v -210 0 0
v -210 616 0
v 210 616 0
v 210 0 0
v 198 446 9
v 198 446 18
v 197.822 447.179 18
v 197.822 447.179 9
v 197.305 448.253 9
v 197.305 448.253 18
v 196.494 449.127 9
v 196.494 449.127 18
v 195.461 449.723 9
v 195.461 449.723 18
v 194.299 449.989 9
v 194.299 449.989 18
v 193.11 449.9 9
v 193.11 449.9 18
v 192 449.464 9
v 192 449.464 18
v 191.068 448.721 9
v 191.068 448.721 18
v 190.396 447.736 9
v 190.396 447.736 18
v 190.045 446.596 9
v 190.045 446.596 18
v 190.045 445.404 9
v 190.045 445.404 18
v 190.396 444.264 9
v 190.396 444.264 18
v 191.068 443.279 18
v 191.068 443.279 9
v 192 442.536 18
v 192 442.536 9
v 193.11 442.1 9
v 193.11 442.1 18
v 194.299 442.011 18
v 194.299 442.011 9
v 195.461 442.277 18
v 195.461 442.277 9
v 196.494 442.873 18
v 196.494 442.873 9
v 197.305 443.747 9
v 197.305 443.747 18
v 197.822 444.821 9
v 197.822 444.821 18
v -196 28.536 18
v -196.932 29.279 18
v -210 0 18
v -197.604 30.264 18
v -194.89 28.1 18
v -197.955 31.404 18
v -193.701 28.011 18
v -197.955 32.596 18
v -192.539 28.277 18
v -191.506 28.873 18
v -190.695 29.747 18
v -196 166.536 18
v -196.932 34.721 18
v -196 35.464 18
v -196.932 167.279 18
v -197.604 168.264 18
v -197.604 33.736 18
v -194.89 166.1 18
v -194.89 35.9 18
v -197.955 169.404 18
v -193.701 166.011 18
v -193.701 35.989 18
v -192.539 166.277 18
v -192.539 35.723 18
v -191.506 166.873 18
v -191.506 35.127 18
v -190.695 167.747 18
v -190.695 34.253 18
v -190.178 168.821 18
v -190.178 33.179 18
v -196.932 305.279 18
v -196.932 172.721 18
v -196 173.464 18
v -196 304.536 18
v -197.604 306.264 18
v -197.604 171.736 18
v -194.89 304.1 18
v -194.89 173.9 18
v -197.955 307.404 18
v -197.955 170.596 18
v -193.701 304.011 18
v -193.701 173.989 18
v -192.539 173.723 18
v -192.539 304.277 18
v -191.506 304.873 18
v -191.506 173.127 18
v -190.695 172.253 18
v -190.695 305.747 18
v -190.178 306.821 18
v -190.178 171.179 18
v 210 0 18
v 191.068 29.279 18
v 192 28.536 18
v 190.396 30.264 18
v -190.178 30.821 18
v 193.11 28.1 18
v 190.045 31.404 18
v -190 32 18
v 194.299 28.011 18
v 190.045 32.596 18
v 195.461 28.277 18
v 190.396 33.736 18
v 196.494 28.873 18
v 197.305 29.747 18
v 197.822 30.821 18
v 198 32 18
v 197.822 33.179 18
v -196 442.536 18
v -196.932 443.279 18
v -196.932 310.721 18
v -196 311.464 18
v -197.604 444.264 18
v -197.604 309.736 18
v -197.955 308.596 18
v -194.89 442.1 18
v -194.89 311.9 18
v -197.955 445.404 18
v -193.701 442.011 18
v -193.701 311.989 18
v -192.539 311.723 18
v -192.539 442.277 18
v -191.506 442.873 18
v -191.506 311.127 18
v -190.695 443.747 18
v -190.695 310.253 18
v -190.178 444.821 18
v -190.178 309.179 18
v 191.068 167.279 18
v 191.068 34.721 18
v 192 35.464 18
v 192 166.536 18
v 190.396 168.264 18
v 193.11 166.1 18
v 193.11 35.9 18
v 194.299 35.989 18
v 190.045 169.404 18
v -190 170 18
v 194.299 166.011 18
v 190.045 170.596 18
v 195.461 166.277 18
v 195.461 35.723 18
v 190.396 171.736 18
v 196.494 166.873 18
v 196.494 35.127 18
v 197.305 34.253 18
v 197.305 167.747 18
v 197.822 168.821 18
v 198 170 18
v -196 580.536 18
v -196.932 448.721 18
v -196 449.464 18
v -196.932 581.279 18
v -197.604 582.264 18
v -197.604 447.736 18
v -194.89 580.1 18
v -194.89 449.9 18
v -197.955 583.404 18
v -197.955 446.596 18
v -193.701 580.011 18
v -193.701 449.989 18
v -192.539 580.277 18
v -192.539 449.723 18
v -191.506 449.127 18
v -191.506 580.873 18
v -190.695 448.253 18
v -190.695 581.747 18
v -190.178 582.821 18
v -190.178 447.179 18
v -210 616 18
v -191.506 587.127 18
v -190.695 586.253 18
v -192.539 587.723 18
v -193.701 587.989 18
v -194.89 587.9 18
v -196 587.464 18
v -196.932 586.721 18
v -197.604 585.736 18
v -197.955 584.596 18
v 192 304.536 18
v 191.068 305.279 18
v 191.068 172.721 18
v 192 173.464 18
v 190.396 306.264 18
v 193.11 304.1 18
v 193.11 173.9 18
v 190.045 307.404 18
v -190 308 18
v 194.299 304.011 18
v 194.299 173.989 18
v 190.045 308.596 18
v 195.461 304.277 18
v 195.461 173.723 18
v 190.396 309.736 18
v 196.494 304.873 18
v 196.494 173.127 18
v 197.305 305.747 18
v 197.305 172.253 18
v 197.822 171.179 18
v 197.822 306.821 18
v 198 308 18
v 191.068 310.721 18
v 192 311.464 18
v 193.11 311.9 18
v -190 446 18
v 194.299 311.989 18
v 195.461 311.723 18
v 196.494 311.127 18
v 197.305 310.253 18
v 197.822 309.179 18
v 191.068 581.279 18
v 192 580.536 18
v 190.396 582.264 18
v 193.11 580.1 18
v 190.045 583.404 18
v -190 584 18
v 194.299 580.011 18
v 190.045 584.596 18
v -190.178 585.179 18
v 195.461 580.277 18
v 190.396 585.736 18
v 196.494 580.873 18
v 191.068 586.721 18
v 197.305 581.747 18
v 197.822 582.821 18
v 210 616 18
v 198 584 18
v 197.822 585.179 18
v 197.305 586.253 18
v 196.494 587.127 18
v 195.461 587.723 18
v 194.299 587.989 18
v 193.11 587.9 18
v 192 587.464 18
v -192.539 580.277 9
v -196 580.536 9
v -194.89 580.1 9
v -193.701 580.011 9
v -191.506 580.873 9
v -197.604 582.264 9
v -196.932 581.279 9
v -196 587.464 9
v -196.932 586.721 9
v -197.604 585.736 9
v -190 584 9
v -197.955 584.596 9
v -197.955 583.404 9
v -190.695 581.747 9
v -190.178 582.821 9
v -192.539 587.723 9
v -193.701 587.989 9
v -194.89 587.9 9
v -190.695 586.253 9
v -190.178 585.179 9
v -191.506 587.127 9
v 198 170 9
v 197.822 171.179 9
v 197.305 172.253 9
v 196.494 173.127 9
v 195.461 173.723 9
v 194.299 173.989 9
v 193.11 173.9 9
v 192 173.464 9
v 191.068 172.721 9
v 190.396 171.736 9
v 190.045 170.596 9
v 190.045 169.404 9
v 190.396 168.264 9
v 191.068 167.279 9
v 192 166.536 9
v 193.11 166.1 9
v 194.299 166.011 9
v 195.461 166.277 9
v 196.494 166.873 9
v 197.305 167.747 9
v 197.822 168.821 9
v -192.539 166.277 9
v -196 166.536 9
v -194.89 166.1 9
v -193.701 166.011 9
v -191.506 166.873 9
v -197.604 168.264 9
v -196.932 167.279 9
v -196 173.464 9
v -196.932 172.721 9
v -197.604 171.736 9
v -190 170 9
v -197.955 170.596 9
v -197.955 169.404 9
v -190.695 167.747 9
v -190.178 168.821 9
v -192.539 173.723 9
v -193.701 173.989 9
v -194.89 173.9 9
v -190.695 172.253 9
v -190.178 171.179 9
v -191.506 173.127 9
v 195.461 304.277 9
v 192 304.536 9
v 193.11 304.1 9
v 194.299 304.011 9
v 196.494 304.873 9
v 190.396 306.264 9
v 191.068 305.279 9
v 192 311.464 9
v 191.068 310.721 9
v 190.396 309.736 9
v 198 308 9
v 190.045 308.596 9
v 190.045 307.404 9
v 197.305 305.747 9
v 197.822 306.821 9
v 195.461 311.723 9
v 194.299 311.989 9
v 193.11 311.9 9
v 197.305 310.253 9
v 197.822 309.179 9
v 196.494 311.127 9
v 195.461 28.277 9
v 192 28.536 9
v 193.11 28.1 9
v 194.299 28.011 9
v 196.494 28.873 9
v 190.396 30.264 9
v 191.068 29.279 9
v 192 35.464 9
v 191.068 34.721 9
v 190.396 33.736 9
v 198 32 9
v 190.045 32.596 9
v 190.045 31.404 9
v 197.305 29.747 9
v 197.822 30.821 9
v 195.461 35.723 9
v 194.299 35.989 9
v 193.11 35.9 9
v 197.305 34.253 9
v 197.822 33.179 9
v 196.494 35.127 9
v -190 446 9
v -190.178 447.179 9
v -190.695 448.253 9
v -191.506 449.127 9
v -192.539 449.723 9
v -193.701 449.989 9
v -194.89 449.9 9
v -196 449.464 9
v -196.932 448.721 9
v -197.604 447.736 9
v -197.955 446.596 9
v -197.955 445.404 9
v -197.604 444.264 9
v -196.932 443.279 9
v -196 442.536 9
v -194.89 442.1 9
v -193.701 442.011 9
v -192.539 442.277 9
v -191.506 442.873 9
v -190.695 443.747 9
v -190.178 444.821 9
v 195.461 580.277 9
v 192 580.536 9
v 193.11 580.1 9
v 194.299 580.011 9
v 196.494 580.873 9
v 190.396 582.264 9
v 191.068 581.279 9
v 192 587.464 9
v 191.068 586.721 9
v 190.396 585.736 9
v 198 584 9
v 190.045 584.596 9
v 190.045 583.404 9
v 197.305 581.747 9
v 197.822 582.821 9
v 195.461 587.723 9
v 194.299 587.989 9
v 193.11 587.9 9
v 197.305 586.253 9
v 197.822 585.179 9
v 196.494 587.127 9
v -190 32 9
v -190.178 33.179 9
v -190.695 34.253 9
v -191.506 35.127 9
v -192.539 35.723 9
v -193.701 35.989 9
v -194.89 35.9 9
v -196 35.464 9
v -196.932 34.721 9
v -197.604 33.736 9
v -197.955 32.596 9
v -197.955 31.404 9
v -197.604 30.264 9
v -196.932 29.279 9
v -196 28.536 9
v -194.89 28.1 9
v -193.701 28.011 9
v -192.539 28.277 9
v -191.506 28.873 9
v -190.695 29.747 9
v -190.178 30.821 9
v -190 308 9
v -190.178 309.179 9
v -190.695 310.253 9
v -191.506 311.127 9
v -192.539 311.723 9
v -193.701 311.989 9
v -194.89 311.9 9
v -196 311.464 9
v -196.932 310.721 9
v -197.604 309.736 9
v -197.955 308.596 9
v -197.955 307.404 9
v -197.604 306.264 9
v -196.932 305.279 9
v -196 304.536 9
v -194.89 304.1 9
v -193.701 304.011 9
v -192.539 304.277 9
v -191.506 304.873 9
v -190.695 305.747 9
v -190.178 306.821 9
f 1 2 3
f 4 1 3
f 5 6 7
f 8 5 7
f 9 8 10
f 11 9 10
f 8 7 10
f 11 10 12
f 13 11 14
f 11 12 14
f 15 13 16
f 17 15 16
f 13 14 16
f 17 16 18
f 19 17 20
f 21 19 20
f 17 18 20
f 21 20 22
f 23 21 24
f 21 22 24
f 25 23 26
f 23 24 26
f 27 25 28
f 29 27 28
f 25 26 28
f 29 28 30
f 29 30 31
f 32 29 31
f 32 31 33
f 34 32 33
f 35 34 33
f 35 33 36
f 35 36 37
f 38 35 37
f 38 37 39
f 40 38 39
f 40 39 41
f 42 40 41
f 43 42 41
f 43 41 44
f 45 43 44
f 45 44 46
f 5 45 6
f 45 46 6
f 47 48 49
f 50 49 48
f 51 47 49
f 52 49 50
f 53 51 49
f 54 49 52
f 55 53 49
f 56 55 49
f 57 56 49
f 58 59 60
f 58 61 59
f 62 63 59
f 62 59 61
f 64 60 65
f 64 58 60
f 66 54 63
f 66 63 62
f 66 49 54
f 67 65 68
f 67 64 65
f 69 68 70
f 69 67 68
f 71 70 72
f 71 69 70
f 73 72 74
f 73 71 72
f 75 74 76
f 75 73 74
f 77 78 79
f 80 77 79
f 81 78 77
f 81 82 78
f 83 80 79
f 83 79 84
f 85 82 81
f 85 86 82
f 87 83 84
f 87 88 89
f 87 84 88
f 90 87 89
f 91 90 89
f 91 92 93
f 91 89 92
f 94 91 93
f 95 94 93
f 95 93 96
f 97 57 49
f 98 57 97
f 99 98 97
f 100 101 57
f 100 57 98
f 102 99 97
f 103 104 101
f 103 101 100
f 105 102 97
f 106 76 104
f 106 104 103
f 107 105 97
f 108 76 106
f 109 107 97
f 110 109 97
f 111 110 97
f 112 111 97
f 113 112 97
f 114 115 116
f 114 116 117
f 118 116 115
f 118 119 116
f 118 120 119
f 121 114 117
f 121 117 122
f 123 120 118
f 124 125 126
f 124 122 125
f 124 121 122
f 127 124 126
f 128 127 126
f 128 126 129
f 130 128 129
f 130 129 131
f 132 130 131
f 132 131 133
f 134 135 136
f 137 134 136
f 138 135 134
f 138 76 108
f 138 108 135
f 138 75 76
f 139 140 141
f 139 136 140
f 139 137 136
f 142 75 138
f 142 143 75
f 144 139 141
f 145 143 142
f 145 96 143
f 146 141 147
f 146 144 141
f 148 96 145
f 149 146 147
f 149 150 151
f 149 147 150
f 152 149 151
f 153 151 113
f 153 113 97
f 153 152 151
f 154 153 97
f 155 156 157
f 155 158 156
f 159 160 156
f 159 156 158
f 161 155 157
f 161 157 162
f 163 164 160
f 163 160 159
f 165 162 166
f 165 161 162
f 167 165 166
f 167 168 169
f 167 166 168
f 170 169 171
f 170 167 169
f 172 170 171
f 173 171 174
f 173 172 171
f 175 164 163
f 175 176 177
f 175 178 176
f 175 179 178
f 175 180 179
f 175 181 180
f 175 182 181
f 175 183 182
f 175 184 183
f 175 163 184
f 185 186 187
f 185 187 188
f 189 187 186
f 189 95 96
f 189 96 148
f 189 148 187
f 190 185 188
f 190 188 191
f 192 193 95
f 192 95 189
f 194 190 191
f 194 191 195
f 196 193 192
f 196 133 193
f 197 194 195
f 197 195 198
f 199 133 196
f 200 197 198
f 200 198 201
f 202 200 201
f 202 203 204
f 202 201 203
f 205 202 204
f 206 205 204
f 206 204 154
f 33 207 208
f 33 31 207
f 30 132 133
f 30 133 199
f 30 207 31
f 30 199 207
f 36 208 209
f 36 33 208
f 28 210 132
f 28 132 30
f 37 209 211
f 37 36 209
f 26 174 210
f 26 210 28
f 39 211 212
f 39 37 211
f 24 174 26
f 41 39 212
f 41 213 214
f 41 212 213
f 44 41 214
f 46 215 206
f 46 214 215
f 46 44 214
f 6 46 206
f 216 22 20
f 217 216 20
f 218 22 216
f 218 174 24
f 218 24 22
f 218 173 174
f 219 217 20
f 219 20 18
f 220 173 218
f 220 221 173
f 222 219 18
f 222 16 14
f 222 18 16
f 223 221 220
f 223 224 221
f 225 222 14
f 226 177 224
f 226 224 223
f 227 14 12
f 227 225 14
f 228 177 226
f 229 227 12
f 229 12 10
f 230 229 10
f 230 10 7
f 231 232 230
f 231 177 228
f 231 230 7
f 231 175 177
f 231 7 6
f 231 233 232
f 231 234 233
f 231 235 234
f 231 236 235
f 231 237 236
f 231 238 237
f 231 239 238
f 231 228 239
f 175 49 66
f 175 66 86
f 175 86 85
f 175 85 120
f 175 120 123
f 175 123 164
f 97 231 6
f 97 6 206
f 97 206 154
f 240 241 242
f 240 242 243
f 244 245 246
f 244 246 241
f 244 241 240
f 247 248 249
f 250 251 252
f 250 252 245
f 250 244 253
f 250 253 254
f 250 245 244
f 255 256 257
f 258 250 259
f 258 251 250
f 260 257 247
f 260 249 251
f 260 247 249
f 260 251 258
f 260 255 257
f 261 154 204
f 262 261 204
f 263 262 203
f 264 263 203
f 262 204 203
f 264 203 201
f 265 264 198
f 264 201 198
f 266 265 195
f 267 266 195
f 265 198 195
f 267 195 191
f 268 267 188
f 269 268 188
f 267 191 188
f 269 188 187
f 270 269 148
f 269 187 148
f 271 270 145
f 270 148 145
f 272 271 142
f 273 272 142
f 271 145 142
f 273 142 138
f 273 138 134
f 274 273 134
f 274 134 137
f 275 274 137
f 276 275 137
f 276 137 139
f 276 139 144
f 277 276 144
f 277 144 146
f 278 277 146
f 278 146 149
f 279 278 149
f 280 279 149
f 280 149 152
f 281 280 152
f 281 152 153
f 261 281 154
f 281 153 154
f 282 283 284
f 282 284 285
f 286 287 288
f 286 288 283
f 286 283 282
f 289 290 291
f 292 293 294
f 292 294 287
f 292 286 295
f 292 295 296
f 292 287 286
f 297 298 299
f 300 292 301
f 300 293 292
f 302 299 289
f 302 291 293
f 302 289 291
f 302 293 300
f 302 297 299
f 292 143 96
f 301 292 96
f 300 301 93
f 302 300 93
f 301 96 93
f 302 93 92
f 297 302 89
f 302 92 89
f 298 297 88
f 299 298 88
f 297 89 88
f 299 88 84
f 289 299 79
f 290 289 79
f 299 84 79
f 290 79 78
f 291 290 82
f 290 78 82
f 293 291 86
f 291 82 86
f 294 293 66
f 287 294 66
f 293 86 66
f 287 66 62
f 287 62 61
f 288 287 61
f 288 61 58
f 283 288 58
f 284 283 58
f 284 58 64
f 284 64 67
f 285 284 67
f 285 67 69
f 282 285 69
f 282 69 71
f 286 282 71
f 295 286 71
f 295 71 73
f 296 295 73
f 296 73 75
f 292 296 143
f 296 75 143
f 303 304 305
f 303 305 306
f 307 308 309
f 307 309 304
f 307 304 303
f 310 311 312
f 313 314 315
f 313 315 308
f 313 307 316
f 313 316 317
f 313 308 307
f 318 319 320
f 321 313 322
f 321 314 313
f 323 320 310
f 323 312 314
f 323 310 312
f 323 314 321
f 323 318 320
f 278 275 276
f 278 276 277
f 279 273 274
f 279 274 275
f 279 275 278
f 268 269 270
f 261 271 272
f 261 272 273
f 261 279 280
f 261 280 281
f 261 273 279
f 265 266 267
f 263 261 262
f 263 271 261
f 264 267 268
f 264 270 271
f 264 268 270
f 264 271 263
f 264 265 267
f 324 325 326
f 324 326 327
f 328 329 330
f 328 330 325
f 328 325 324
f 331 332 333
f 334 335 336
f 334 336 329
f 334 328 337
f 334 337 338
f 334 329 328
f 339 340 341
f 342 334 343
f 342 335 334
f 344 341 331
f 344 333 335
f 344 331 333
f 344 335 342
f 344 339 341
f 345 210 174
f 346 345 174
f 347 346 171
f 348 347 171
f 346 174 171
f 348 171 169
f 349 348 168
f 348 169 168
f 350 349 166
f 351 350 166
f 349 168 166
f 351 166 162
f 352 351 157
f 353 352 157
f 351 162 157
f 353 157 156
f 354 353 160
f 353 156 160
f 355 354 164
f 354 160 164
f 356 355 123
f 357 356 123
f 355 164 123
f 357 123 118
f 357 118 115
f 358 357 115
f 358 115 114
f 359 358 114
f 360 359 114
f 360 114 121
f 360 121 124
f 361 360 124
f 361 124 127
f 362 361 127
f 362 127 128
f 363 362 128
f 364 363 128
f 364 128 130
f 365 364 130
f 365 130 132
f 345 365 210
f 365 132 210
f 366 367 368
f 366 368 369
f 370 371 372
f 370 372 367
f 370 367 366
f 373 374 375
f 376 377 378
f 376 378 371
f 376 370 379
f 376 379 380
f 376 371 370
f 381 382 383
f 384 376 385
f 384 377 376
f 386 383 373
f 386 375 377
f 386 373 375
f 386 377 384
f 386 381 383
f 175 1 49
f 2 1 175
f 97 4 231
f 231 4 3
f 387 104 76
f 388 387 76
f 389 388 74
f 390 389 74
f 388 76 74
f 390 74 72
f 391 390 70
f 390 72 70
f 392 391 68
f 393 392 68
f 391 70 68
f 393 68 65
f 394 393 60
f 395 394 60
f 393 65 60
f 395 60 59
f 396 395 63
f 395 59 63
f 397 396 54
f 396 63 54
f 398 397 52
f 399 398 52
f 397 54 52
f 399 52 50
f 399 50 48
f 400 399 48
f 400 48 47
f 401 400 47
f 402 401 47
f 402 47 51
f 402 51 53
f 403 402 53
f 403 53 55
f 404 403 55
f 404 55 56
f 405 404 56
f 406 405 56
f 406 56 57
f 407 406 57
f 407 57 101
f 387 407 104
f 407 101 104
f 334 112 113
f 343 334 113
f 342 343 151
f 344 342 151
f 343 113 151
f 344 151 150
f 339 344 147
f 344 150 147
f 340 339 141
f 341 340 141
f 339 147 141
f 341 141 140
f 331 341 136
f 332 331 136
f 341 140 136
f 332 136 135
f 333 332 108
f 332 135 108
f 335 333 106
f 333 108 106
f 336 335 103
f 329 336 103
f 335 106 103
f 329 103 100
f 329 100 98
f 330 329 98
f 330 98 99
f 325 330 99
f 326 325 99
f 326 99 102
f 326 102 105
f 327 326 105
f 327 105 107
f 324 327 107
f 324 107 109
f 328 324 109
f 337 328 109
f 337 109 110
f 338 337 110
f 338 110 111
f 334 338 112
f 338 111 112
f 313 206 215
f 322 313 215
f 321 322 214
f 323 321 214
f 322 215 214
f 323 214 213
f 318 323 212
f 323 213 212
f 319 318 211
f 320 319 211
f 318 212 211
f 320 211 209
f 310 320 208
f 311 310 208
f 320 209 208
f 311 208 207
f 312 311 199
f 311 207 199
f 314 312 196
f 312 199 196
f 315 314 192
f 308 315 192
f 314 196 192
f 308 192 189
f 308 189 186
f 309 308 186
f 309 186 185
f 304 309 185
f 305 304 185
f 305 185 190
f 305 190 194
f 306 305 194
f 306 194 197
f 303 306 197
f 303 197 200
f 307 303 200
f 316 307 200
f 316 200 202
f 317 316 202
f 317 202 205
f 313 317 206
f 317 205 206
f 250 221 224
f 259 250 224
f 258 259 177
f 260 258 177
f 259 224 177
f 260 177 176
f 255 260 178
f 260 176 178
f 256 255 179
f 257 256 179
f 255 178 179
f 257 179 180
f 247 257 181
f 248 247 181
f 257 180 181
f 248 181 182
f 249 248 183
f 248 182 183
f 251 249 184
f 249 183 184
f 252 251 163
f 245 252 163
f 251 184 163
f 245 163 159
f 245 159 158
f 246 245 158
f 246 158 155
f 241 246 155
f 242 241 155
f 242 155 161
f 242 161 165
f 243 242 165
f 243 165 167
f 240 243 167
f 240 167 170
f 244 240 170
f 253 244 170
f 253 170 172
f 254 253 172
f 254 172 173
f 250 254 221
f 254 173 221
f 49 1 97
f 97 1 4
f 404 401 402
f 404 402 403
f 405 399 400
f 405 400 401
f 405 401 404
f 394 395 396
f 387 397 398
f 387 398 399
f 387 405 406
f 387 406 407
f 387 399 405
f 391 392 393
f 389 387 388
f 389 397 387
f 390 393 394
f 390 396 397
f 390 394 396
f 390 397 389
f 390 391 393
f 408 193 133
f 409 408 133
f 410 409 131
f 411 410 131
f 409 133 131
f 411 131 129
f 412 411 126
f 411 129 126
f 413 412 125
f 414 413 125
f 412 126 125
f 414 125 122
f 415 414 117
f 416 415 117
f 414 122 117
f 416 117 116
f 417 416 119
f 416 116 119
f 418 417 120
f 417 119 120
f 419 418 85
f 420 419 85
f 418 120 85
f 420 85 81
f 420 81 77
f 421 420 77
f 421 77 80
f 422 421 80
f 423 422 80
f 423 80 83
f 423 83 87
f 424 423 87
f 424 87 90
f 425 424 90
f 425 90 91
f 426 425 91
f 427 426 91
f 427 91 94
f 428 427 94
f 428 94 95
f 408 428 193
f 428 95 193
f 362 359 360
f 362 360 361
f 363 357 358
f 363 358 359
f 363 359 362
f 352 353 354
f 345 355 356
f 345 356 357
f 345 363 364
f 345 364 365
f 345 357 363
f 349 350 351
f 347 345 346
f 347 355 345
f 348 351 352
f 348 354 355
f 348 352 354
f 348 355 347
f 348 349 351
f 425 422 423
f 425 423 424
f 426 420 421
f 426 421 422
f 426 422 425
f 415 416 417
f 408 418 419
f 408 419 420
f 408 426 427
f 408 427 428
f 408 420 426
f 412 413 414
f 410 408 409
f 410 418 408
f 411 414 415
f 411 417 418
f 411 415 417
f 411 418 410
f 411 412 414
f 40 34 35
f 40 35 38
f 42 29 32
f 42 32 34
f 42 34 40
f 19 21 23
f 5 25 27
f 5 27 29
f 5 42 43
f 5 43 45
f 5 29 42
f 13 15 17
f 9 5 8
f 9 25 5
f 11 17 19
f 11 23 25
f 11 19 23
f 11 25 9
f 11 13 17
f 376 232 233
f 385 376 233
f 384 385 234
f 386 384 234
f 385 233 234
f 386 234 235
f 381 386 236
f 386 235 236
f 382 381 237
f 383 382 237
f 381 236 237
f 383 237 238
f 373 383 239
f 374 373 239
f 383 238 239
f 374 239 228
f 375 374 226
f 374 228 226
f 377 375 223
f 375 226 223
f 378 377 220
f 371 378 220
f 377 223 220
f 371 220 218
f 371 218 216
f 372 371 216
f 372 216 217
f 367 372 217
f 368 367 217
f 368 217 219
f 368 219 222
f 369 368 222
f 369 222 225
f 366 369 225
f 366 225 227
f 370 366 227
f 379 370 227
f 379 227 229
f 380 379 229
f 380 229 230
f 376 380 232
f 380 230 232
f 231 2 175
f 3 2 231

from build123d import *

# Parameters (mm, degrees)
SKETCH_W                        = 420
SKETCH_H                        = 616
PAD_DEPTH                       = 18
SKETCH014_R                     = 4
POCKET006_DEPTH                 = 9
SKETCH014_LINEARPATTERN_2_R     = 4
POCKET006_LINEARPATTERN_2_DEPTH = 9
LINEARPATTERN001_COUNT          = 5
LINEARPATTERN001_PITCH          = 138


with BuildPart() as part:
    # Sketch → Pad (new body)
    with BuildSketch(Plane.XY):
        with Locations((0, 308)):
            Rectangle(SKETCH_W, SKETCH_H)
    extrude(amount=PAD_DEPTH)

    # Sketch014 (on Face6 of Pad) → Pocket006 (cut)
    with BuildSketch(Plane.XY.offset(18)):
        with Locations((-194, 32)):
            Circle(SKETCH014_R)
    pocket006 = extrude(amount=-POCKET006_DEPTH, mode=Mode.SUBTRACT)

    # Sketch014 LinearPattern 2 → Pocket006 LinearPattern 2 (cut)
    with BuildSketch(Plane(origin=(388, 0, 18), x_dir=(1, 0, 0), z_dir=(0, 0, 1))):
        with Locations((-194, 32)):
            Circle(SKETCH014_LINEARPATTERN_2_R)
    pocket006_linearpattern_2 = extrude(amount=-POCKET006_LINEARPATTERN_2_DEPTH, mode=Mode.SUBTRACT)

    # LinearPattern001: Pocket006, Pocket006 LinearPattern 2 ×5
    with Locations(*[(0, i * LINEARPATTERN001_PITCH, 0) for i in range(1, LINEARPATTERN001_COUNT)]):
        add(pocket006, mode=Mode.SUBTRACT)
        add(pocket006_linearpattern_2, mode=Mode.SUBTRACT)


solid = part.part
